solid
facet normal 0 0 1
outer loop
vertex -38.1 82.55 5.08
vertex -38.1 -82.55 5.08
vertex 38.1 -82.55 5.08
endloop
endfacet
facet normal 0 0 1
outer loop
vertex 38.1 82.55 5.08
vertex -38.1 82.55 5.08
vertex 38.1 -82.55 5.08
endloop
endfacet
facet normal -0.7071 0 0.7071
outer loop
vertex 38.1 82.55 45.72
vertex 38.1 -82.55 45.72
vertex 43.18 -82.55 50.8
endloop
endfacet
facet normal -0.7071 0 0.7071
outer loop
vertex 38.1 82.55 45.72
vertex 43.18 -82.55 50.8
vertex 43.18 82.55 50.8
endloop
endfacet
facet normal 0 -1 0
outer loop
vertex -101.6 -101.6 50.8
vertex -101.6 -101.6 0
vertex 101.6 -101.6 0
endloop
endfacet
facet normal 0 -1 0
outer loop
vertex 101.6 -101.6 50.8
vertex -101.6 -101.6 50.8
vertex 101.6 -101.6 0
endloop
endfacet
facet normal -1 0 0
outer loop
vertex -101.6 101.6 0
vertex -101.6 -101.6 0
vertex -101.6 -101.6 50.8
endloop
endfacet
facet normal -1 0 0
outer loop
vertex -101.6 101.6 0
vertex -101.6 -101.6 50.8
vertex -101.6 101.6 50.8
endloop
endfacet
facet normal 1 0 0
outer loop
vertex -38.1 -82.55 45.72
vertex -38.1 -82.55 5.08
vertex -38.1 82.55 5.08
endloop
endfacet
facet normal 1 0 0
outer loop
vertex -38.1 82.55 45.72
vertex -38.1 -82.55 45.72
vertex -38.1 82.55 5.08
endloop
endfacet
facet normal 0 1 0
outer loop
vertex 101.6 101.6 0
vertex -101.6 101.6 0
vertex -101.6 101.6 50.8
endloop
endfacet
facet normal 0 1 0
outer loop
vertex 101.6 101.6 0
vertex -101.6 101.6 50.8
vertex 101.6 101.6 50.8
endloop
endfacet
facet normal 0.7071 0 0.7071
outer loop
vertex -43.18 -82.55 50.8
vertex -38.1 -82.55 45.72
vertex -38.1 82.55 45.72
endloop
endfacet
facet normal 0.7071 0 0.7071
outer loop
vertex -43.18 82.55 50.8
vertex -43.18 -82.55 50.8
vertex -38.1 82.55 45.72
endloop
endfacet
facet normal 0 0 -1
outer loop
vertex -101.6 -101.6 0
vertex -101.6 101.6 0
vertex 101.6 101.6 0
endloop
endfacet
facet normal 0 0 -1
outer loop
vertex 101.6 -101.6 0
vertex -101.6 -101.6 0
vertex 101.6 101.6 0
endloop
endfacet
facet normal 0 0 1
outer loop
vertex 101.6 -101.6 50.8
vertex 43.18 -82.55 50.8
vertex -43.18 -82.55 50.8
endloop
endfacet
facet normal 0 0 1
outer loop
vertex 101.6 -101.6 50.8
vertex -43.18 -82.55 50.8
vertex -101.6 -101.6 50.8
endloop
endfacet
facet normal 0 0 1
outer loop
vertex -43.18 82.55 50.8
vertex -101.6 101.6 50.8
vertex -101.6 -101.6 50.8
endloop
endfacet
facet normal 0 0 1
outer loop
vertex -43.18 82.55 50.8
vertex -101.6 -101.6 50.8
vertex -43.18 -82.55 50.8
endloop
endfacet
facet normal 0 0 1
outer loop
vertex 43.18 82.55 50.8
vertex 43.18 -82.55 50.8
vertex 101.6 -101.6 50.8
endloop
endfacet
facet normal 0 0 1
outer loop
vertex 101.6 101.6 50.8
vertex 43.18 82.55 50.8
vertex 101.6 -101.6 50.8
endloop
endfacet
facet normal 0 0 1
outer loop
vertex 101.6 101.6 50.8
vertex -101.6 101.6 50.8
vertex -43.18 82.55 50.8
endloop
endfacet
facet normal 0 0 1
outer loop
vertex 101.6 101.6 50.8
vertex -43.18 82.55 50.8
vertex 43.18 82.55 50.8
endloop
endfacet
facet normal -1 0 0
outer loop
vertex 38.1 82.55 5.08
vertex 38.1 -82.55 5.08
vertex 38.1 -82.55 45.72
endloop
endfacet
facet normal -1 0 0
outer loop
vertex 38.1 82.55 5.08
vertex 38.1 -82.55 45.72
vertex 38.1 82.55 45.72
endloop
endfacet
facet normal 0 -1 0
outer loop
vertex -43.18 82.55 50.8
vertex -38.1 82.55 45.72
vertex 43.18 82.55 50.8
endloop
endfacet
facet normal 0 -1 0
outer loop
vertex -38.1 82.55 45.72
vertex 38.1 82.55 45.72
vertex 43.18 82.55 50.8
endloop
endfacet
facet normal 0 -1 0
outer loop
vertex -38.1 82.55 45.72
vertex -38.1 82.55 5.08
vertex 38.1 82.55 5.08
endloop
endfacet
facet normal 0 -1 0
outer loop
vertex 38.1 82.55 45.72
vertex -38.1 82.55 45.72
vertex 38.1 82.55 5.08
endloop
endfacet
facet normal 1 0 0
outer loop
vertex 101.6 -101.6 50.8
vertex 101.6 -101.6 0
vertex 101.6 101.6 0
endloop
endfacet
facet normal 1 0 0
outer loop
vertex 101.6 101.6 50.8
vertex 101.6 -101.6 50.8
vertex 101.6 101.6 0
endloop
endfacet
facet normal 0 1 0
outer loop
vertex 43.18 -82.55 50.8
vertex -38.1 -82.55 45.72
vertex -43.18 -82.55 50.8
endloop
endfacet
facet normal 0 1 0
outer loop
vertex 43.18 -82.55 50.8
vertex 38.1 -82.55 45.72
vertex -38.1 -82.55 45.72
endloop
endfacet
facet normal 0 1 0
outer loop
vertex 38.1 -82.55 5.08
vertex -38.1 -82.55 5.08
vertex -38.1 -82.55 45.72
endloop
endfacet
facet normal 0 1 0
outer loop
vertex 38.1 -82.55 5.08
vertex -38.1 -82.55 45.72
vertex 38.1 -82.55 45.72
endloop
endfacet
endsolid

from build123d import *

# Parameters (mm, degrees)
F0_W     = 203.2
F0_H     = 203.2
F0_W_2   = 76.2
F0_H_2   = 165.1
F1_DEPTH = 5.08
F2_DEPTH = 50.8
F3_SIZE  = 5.08


with BuildPart() as f1:
    # F0 (on Top) → F1 (new body)
    with BuildSketch(Plane.XY):
        Rectangle(F0_W, F0_H)
        Rectangle(F0_W_2, F0_H_2, mode=Mode.SUBTRACT)
        Rectangle(F0_W_2, F0_H_2)
    extrude(amount=F1_DEPTH)

    # F0 (on Top) → F2 (join)
    with BuildSketch(Plane.XY):
        Rectangle(F0_W, F0_H)
        Rectangle(F0_W_2, F0_H_2, mode=Mode.SUBTRACT)
    extrude(amount=F2_DEPTH)

    # F3
    f3_edges = [f1.edges().sort_by_distance(p)[0] for p in [
        (-38.1, 0, 50.8),
        (38.1, 0, 50.8),
    ]]
    chamfer(f3_edges, length=F3_SIZE)


solid = f1.part
